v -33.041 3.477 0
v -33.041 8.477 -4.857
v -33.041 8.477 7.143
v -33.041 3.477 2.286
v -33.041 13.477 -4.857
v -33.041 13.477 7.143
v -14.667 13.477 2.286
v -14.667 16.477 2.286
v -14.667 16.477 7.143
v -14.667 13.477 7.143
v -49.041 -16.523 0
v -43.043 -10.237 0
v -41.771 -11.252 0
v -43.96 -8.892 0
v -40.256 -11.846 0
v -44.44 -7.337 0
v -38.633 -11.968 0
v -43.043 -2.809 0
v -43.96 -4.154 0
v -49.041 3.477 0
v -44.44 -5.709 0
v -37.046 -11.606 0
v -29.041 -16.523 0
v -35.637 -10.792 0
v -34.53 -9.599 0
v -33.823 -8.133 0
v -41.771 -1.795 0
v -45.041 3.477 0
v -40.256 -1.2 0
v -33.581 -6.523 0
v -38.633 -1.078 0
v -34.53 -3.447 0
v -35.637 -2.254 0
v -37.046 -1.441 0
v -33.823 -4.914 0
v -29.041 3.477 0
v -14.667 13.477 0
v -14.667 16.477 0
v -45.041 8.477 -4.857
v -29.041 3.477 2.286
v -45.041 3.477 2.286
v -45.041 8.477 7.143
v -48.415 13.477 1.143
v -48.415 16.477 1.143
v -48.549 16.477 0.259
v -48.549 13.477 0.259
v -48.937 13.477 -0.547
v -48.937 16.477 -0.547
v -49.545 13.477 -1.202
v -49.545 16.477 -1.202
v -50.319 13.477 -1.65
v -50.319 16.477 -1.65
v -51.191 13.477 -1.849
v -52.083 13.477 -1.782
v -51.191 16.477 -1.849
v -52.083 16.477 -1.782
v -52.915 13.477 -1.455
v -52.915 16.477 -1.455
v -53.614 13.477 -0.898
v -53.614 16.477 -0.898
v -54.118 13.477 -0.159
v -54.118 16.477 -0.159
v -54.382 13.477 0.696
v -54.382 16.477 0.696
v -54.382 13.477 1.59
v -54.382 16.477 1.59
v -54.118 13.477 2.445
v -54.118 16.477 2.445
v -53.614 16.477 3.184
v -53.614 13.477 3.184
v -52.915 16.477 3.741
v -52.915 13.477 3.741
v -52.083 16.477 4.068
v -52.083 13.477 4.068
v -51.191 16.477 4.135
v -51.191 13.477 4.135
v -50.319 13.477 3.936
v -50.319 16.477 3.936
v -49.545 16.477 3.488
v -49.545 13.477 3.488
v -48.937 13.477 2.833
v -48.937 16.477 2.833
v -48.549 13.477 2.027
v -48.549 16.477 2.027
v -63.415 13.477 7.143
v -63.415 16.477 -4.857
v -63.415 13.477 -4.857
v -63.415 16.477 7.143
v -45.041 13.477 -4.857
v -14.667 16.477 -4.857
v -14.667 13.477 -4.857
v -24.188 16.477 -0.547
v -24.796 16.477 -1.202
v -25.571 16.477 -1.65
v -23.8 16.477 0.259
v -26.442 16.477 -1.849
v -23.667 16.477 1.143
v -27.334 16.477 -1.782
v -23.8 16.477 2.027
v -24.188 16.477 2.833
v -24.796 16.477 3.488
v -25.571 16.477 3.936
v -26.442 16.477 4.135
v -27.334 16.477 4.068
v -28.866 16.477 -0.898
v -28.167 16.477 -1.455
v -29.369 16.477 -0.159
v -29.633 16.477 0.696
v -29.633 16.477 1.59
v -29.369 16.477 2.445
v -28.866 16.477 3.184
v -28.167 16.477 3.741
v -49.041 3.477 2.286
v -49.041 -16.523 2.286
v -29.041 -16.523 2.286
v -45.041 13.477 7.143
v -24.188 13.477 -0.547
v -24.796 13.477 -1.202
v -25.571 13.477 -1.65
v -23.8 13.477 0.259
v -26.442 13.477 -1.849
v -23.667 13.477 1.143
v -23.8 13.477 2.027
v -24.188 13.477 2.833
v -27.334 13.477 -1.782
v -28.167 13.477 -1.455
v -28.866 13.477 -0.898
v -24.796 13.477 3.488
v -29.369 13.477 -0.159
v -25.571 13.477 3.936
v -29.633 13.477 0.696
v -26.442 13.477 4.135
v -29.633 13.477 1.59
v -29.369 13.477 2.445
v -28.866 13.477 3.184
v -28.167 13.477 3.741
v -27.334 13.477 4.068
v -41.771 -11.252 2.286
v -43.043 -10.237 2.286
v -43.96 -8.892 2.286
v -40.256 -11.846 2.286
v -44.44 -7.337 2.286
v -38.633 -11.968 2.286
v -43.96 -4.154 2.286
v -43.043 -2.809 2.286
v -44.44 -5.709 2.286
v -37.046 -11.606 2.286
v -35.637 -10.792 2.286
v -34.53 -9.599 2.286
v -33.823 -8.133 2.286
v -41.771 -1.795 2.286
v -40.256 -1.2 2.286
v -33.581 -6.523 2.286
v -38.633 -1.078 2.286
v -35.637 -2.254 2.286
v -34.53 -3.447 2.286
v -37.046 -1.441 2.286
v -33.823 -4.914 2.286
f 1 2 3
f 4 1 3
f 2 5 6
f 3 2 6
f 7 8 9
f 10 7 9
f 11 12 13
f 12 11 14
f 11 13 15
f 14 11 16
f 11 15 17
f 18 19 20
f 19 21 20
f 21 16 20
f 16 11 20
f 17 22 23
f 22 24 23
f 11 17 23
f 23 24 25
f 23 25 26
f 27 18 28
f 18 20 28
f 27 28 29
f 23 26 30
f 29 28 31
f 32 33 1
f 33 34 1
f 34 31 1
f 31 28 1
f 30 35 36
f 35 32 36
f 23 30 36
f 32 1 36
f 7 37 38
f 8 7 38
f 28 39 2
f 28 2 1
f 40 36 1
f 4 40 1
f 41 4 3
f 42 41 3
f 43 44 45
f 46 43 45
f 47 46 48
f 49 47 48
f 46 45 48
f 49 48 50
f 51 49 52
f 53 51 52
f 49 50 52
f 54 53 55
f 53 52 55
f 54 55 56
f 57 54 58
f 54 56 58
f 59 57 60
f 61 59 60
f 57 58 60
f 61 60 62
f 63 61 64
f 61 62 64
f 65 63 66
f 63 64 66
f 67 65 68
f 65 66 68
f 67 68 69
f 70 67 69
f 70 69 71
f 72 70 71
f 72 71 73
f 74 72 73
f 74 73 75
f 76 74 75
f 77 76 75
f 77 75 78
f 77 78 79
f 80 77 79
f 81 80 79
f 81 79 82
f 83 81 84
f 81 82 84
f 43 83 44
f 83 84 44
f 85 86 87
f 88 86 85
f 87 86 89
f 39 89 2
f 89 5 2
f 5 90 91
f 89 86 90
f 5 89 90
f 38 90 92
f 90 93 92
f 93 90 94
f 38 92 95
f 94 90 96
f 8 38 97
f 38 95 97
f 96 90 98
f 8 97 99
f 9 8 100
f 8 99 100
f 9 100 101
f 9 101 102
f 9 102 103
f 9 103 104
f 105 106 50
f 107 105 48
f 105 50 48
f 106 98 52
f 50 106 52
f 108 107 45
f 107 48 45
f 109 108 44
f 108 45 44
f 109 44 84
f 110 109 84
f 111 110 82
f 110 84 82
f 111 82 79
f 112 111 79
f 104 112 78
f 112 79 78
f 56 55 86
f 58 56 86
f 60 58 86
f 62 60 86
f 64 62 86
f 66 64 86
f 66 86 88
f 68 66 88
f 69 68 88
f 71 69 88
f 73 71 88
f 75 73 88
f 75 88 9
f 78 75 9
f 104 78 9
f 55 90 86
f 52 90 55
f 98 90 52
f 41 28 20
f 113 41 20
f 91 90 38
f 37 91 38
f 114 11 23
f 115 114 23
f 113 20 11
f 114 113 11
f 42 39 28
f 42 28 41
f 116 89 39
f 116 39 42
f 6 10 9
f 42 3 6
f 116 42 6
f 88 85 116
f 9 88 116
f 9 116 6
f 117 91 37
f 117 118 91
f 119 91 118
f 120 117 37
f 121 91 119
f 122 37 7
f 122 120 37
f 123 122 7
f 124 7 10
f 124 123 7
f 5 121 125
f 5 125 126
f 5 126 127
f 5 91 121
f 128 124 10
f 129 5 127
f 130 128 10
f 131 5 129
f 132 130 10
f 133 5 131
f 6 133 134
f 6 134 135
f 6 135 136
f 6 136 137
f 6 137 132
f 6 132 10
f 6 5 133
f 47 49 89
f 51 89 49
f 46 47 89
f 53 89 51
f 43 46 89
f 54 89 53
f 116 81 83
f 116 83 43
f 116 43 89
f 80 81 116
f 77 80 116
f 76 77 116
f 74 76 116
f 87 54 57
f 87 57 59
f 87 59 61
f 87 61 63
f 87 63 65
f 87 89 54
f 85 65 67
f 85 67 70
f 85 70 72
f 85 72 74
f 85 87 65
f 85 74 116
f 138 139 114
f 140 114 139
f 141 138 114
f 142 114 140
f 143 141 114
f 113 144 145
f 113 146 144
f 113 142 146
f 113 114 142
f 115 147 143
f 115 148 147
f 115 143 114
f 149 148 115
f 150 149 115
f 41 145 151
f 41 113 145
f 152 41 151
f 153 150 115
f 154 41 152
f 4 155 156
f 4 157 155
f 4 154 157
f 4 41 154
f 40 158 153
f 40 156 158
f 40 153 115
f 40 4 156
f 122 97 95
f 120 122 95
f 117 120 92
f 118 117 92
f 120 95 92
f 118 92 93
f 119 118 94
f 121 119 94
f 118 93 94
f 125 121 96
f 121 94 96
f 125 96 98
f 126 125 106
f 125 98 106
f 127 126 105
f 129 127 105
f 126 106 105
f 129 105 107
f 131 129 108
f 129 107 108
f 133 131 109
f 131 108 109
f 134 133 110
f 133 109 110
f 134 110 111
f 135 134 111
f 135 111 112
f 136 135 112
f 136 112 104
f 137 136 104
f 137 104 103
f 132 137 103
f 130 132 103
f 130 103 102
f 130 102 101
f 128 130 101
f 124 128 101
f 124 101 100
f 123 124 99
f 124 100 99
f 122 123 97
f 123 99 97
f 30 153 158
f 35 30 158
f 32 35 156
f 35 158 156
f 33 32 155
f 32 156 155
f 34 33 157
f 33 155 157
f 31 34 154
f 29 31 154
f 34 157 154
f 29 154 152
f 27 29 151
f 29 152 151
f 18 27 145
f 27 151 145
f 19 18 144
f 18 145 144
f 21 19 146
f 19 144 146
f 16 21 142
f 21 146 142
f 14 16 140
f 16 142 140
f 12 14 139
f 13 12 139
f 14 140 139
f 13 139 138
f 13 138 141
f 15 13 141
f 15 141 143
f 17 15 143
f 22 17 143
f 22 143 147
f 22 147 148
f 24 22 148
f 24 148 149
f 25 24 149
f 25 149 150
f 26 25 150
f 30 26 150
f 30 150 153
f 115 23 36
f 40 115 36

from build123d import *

# Parameters (mm, degrees)
SALIENTE_EXTRUIR1_DEPTH = 2.286
CROQUIS3_W              = 12
CROQUIS3_H              = 3
SALIENTE_EXTRUIR2_DEPTH = 48.748737
SALIENTE_EXTRUIR3_DEPTH = 12
CROQUIS5_R              = 5.46
CORTAR_EXTRUIR1_DEPTH   = 8.143
CROQUIS6_R              = 3
CORTAR_EXTRUIR2_DEPTH   = 3


with BuildPart() as part:
    # Croquis1 → Saliente-Extruir1 (new body)
    with BuildSketch(Plane.XY):
        Polygon((-14.666527812, 16.476832902), (-63.415265152, 16.476832902), (-63.415265152, 13.476832902), (-45.040896482, 13.476832902), (-45.040896482, 8.476832902), (-45.040896482, 3.476832902), (-49.040896482, 3.476832902), (-49.040896482, -16.523167098), (-29.040896482, -16.523167098), (-29.040896482, 3.476832902), (-33.040896482, 3.476832902), (-33.040896482, 8.476832902), (-33.040896482, 13.476832902), (-14.666527812, 13.476832902), align=None)
    extrude(amount=SALIENTE_EXTRUIR1_DEPTH)

    # Croquis3 → Saliente-Extruir2 (add)
    with BuildSketch(Plane.ZY.offset(63.415265152)):
        with Locations((1.143, 14.976832902)):
            Rectangle(CROQUIS3_W, CROQUIS3_H)
    extrude(amount=-SALIENTE_EXTRUIR2_DEPTH)

    # Croquis4 → Saliente-Extruir3 (add)
    with BuildSketch(Plane(origin=(-33.040896482, 0, 0), x_dir=(0, 0, -1), z_dir=(1, 0, 0))):
        Polygon((4.857, 8.476832902), (0, 3.476832902), (-2.286, 3.476832902), (-7.143, 8.476832902), (-7.143, 13.476832902), (4.857, 13.476832902), align=None)
    extrude(amount=-SALIENTE_EXTRUIR3_DEPTH)

    # Croquis5 → Cortar-Extruir1 (cut, through all)
    with BuildSketch(Plane.XY.offset(2.286)):
        with Locations((-39.040896482, -6.523167098)):
            Circle(CROQUIS5_R)
    extrude(amount=-CORTAR_EXTRUIR1_DEPTH, mode=Mode.SUBTRACT)

    # Croquis6 → Cortar-Extruir2 (cut)
    with BuildSketch(Plane(origin=(0, 16.476832902, 0), x_dir=(1, 0, 0), z_dir=(0, 1, 0))):
        with Locations((-26.666527812, -1.143)):
            Circle(CROQUIS6_R)
        with Locations((-51.415265152, -1.143)):
            Circle(CROQUIS6_R)
    extrude(amount=-CORTAR_EXTRUIR2_DEPTH, mode=Mode.SUBTRACT)


solid = part.part
